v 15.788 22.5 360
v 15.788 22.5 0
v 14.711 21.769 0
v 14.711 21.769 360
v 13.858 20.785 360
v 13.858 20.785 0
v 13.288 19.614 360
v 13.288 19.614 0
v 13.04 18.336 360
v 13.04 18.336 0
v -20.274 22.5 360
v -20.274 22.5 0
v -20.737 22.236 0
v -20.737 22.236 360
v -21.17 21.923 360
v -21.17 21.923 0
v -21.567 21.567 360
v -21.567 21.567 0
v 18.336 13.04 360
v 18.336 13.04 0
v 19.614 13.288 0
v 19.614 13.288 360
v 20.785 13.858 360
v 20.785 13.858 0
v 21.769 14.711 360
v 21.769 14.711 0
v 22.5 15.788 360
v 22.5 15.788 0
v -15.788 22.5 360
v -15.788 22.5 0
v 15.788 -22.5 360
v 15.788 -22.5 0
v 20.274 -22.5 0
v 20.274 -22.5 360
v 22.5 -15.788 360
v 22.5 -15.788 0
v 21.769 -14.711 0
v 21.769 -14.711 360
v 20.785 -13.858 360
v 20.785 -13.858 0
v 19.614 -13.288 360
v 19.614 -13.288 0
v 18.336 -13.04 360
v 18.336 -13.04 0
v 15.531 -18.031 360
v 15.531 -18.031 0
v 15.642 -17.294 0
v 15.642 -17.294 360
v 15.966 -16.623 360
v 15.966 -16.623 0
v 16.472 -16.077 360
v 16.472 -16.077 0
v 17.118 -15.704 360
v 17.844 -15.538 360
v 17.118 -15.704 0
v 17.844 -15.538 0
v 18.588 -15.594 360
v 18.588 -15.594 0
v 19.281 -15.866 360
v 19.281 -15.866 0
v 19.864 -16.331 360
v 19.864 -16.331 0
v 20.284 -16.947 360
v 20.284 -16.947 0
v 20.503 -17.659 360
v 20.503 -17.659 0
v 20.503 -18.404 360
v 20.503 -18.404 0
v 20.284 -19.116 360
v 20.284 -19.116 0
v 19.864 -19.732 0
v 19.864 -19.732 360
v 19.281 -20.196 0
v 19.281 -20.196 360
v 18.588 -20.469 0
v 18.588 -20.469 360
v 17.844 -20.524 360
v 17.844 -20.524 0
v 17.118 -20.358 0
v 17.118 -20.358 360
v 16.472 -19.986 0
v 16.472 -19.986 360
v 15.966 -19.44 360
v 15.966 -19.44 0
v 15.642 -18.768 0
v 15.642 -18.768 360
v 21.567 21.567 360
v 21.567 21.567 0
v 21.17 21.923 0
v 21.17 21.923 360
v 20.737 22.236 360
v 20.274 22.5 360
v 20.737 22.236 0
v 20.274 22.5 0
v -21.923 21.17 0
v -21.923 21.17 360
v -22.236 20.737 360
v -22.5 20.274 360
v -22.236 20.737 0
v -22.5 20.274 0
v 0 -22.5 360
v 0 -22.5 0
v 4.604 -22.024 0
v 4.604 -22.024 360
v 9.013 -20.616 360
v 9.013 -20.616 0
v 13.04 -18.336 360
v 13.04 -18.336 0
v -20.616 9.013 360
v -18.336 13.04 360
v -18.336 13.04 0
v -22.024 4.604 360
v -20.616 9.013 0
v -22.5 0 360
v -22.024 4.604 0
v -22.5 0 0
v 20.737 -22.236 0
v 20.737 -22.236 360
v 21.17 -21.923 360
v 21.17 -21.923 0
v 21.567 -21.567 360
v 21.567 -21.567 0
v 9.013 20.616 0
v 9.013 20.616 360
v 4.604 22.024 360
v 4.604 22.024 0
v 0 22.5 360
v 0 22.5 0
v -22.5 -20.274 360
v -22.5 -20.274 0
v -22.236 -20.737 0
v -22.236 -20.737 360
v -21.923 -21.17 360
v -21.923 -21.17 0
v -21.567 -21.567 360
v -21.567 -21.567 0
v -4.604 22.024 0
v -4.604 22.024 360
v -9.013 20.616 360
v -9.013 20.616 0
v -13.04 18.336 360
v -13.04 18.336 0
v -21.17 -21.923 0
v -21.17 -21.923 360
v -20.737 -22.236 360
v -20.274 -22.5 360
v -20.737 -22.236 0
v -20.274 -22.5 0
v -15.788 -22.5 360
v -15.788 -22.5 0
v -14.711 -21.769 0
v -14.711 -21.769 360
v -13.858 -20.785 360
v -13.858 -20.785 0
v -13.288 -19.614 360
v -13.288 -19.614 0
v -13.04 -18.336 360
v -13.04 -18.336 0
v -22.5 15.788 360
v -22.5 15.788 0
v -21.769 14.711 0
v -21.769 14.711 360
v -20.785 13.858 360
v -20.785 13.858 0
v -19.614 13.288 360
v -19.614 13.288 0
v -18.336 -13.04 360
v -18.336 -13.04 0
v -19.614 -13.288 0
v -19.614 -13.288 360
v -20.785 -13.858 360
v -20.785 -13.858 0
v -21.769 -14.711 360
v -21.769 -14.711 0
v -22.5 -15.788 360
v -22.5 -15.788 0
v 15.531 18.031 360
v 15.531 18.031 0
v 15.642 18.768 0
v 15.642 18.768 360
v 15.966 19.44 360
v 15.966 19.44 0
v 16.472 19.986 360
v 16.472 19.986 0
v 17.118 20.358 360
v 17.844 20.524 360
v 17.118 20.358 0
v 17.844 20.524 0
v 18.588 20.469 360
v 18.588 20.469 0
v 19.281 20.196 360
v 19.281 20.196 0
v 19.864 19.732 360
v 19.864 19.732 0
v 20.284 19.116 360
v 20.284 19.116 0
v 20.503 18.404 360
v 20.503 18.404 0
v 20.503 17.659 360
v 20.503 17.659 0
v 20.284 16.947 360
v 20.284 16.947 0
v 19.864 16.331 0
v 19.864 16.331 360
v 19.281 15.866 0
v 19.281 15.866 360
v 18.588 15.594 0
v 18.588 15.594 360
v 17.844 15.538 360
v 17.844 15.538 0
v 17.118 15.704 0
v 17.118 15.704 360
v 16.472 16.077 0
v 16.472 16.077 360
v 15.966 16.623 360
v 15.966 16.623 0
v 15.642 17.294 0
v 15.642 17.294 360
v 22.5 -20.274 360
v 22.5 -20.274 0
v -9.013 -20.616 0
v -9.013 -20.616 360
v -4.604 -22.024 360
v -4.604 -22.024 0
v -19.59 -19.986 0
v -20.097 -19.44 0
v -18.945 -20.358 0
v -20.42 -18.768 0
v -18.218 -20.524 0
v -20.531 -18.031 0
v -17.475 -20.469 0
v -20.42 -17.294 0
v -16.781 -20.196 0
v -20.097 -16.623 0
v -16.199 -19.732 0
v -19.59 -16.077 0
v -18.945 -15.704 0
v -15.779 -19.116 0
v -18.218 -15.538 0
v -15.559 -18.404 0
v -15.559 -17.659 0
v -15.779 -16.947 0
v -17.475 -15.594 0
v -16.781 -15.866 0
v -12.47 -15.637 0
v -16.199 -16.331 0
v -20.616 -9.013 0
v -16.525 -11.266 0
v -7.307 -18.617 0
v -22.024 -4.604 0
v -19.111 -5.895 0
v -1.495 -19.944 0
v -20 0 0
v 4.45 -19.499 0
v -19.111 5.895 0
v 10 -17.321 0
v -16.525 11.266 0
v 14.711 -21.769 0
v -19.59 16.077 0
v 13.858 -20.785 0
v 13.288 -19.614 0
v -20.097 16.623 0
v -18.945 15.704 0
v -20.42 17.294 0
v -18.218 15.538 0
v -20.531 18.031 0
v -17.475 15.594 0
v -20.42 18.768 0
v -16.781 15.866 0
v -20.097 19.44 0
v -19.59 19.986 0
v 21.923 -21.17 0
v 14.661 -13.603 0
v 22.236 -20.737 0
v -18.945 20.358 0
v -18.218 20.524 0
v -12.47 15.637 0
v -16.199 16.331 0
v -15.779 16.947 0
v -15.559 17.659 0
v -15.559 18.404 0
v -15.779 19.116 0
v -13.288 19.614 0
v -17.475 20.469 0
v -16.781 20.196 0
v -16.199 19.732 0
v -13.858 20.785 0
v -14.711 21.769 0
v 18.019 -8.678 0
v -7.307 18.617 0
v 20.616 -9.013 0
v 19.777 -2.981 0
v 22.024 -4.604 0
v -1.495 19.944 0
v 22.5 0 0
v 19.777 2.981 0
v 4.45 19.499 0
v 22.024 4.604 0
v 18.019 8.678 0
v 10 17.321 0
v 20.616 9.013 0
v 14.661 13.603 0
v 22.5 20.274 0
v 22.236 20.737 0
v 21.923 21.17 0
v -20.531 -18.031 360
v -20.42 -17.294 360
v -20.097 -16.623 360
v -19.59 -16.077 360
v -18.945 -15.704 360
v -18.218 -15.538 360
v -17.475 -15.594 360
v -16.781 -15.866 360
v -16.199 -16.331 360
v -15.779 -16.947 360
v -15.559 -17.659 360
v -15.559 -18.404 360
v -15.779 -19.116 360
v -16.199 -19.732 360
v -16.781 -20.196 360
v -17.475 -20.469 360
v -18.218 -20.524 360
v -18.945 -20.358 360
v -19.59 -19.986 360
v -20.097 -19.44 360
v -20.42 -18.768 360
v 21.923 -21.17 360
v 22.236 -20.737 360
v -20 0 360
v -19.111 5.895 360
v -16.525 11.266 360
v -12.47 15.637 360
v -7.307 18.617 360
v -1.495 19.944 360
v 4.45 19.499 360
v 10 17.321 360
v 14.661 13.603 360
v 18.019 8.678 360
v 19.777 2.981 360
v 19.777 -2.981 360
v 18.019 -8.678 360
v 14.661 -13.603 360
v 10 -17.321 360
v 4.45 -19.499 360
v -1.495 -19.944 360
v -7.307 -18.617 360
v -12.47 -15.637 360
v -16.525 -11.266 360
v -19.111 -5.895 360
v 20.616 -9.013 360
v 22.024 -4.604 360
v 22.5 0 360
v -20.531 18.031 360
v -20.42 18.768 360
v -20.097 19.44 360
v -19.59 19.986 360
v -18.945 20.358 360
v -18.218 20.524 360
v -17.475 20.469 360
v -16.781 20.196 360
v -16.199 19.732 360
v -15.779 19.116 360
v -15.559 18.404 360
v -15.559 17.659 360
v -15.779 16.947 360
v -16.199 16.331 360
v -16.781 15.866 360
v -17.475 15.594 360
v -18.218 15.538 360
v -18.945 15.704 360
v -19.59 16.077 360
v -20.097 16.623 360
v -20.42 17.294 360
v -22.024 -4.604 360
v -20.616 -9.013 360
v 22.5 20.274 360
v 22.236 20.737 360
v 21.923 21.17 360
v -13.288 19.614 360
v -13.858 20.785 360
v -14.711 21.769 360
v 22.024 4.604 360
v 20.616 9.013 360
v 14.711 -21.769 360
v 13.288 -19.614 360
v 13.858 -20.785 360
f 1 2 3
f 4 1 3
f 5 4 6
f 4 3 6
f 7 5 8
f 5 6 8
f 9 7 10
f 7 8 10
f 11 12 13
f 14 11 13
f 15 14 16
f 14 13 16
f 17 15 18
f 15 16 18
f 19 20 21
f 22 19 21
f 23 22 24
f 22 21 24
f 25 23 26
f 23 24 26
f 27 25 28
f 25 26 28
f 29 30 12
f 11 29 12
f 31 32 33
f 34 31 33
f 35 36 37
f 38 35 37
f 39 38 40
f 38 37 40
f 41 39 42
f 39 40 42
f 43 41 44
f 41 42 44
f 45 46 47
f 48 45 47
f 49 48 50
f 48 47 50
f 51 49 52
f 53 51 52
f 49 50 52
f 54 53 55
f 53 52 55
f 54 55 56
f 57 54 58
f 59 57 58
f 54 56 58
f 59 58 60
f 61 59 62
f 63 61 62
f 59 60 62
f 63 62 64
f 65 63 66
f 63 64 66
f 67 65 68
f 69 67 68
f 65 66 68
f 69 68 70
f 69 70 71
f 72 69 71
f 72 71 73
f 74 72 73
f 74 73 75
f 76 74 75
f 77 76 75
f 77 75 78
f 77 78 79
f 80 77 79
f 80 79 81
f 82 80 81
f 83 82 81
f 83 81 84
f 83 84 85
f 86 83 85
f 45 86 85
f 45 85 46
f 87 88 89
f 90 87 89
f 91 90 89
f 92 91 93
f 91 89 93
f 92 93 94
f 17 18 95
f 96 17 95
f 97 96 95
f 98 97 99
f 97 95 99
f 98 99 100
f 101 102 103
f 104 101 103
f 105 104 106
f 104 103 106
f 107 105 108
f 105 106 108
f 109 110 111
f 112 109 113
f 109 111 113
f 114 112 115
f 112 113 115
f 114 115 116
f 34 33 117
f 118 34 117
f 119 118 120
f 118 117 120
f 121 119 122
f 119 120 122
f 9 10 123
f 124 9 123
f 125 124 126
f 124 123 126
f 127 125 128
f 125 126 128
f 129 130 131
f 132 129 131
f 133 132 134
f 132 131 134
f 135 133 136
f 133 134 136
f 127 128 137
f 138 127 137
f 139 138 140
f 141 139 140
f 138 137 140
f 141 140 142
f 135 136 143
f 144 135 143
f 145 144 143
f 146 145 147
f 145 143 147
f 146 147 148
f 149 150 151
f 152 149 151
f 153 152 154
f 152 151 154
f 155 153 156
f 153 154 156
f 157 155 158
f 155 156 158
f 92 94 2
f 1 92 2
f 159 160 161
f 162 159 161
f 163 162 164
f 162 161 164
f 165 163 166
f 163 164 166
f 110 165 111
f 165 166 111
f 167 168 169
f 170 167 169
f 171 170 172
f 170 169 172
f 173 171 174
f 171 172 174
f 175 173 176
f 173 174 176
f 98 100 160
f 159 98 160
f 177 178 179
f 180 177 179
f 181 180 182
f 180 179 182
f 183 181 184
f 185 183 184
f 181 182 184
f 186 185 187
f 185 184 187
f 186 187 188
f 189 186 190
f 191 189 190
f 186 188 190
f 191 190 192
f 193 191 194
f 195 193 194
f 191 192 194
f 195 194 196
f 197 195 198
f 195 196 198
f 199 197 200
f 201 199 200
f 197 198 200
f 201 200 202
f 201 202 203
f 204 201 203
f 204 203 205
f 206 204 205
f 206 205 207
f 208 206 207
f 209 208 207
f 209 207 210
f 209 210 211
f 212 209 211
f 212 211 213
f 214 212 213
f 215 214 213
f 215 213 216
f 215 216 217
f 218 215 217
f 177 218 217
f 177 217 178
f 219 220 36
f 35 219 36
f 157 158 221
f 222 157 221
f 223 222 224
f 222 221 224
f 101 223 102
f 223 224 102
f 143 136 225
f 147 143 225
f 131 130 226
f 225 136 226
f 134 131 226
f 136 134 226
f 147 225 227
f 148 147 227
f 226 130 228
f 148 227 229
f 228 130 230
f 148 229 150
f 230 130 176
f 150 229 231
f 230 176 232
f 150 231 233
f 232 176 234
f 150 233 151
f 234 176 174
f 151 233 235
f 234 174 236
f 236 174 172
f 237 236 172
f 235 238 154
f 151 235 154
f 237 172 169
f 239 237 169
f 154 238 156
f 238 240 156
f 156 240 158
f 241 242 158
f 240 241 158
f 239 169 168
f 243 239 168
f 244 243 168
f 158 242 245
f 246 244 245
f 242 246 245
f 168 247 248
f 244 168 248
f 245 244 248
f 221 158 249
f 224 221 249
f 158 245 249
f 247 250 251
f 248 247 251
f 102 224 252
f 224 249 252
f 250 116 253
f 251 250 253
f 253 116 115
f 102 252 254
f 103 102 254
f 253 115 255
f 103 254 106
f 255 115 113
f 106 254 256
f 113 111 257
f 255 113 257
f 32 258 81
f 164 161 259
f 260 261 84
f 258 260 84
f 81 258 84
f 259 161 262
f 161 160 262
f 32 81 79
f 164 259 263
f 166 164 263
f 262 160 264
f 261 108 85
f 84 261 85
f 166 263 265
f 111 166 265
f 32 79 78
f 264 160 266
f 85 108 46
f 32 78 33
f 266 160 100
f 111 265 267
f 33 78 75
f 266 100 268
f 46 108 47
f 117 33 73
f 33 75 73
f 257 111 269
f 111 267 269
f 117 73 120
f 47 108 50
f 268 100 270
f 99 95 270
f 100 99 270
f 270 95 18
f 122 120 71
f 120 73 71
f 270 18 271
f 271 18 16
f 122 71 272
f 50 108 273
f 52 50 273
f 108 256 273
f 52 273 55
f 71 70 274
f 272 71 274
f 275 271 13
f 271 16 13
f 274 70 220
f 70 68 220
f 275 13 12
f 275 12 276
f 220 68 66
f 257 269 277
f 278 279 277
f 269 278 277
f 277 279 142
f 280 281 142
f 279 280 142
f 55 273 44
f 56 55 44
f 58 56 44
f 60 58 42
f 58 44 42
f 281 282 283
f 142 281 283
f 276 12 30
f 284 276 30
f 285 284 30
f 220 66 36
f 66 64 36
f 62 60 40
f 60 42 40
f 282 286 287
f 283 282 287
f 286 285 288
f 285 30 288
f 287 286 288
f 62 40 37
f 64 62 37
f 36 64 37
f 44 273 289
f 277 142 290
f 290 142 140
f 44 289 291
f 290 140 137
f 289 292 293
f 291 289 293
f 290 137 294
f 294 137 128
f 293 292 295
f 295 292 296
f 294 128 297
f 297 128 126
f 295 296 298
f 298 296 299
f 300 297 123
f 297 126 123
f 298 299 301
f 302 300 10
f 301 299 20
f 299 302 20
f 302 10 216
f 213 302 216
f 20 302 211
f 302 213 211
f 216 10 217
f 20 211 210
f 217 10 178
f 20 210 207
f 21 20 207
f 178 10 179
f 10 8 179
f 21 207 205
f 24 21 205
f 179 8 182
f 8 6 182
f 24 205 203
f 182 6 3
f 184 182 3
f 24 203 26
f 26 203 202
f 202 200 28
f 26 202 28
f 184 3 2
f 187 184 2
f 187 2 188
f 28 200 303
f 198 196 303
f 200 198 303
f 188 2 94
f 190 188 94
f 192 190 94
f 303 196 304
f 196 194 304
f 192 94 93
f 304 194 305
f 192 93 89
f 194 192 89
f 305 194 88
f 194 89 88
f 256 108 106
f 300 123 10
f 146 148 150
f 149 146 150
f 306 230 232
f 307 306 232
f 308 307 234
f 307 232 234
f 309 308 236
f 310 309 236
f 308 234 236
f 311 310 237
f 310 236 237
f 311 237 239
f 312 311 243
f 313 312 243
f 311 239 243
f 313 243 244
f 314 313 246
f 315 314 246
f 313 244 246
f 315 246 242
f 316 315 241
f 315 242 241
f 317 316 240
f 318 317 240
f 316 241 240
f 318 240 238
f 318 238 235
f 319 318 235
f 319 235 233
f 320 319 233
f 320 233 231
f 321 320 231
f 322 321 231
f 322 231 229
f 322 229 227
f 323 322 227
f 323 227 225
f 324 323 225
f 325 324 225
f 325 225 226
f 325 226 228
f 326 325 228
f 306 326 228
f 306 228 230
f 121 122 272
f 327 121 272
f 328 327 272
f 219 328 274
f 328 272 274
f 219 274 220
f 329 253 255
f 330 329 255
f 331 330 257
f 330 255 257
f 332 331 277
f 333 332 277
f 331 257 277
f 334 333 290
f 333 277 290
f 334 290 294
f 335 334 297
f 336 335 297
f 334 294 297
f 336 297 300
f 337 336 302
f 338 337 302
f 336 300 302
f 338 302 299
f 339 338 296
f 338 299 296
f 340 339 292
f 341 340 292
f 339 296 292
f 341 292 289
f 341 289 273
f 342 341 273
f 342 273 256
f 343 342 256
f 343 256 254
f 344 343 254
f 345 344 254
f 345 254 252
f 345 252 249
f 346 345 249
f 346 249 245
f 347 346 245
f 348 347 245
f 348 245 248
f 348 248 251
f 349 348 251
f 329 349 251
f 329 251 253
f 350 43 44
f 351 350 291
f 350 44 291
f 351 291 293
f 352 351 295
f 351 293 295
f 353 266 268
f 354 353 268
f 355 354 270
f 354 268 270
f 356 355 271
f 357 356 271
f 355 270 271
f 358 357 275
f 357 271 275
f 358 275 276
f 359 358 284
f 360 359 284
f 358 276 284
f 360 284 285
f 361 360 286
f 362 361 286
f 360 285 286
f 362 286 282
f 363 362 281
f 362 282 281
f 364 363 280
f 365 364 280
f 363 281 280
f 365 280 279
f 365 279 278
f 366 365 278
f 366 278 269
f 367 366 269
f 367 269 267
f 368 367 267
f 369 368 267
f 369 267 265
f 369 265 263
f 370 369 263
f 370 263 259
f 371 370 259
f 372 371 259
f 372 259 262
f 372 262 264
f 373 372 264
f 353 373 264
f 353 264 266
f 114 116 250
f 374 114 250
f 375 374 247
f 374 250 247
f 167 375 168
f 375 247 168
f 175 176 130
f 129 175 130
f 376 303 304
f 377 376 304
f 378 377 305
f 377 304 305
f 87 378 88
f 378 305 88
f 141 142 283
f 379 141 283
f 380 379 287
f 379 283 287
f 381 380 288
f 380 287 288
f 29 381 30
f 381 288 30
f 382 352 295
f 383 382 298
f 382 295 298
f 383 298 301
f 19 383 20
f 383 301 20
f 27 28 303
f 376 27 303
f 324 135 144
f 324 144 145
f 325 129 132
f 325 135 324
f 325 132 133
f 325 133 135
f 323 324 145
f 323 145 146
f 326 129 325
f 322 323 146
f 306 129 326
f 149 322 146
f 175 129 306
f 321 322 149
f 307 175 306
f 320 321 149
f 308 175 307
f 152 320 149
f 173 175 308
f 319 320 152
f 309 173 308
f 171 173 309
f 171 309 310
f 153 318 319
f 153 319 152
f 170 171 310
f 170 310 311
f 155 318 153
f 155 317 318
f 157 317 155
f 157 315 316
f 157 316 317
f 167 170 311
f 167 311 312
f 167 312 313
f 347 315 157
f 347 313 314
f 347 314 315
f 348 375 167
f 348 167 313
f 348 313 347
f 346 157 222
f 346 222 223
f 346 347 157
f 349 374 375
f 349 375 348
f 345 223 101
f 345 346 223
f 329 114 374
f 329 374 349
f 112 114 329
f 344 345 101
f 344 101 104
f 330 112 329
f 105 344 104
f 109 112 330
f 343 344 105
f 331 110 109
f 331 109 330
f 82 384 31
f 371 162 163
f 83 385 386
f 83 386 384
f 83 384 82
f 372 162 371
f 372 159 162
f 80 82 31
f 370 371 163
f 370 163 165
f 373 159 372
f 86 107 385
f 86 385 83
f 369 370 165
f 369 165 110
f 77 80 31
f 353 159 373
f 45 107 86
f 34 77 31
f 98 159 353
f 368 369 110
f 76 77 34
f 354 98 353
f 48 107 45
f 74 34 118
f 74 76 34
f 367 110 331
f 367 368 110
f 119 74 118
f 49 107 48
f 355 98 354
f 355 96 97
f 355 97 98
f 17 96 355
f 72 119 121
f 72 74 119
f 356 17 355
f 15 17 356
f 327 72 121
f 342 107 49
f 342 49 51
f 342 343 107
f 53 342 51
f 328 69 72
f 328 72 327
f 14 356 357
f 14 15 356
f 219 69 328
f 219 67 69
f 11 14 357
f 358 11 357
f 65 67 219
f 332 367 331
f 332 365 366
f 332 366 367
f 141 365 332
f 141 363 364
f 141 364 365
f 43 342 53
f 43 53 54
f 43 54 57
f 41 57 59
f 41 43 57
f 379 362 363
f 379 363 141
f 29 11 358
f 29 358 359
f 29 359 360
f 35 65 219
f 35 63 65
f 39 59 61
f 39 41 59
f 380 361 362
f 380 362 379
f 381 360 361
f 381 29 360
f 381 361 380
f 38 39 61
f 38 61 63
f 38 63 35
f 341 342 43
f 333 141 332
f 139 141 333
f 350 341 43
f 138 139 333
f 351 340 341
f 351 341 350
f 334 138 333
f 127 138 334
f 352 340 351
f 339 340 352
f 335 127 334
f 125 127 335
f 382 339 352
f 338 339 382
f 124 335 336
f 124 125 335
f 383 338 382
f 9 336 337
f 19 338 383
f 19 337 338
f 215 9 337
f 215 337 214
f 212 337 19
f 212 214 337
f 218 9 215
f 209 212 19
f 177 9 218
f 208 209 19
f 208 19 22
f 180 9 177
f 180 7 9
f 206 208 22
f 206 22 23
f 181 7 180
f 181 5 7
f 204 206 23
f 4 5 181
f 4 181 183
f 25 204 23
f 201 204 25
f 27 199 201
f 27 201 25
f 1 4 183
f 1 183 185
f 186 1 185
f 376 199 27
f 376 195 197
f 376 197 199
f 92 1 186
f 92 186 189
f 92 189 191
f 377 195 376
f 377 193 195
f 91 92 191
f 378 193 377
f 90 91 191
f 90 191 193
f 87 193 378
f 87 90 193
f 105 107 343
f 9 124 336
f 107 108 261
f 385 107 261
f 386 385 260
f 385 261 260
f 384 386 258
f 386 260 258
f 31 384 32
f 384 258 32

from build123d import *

# Parameters (mm, degrees)
F1_DEPTH = 360
F3_D     = 40
F5_D     = 5


with BuildPart() as f1:
    # F0 (on Top) → F1 (new body)
    with BuildSketch(Plane.XY):
        with BuildLine():
            Line((-14.4956890143, -14.4956890143), (0, 0))
            Line((0, 0), (-14.4956890143, 14.4956890143))
            ThreePointArc((-14.4956890143, 14.4956890143), (-16.2593773691, 13.3556947851), (-18.3356322814, 13.0404980289))
            ThreePointArc((-18.3356322814, 13.0404980289), (-21.4336385815, 6.8446429532), (-22.5, 4.93e-08))
            ThreePointArc((-22.5, 4.93e-08), (-21.4336385965, -6.8446429062), (-18.3356322814, -13.0404980289))
            ThreePointArc((-18.3356322814, -13.0404980289), (-16.2593773691, -13.3556947851), (-14.4956890143, -14.4956890143))
        make_face()
        with BuildLine():
            Line((-14.4956890143, 14.4956890143), (0, 0))
            Line((0, 0), (14.4956890143, 14.4956890143))
            ThreePointArc((14.4956890143, 14.4956890143), (13.3556947851, 16.2593773691), (13.0404980289, 18.3356322814))
            ThreePointArc((13.0404980289, 18.3356322814), (6.8446429123, 21.4336385946), (-3.64e-08, 22.5))
            ThreePointArc((-3.64e-08, 22.5), (-6.844642947, 21.4336385835), (-13.0404980289, 18.3356322814))
            ThreePointArc((-13.0404980289, 18.3356322814), (-13.0335422353, 18.1834982357), (-13.0312229203, 18.0312229203))
            ThreePointArc((-13.0312229203, 18.0312229203), (-13.4118252577, 16.1178057584), (-14.4956890143, 14.4956890143))
        make_face()
        with BuildLine():
            Line((0, 0), (22.5, 0))
            ThreePointArc((22.5, 0), (21.433638589, 6.8446429297), (18.3356322814, 13.0404980289))
            ThreePointArc((18.3356322814, 13.0404980289), (16.2593773691, 13.3556947851), (14.4956890143, 14.4956890143))
            Line((14.4956890143, 14.4956890143), (0, 0))
        make_face()
        with BuildLine():
            ThreePointArc((18.3356322814, -13.0404980289), (21.433638589, -6.8446429297), (22.5, 0))
            Line((22.5, 0), (0, 0))
            Line((0, 0), (14.4956890143, -14.4956890143))
            ThreePointArc((14.4956890143, -14.4956890143), (16.2593773691, -13.3556947851), (18.3356322814, -13.0404980289))
        make_face()
        with BuildLine():
            Line((14.4956890143, -14.4956890143), (0, 0))
            Line((0, 0), (-14.4956890143, -14.4956890143))
            ThreePointArc((-14.4956890143, -14.4956890143), (-13.4118252577, -16.1178057584), (-13.0312229203, -18.0312229203))
            ThreePointArc((-13.0312229203, -18.0312229203), (-13.0335422353, -18.1834982357), (-13.0404980289, -18.3356322814))
            ThreePointArc((-13.0404980289, -18.3356322814), (-6.8446429175, -21.4336385929), (2.56e-08, -22.5))
            ThreePointArc((2.56e-08, -22.5), (6.8446429419, -21.4336385851), (13.0404980289, -18.3356322814))
            ThreePointArc((13.0404980289, -18.3356322814), (13.3556947851, -16.2593773691), (14.4956890143, -14.4956890143))
        make_face()
        with BuildLine():
            ThreePointArc((-18.3356322814, 13.0404980289), (-16.2593773691, 13.3556947851), (-14.4956890143, 14.4956890143))
            Line((-14.4956890143, 14.4956890143), (-15.9099025767, 15.9099025767))
            ThreePointArc((-15.9099025767, 15.9099025767), (-17.18276855, 14.5259238934), (-18.3356322814, 13.0404980289))
        make_face()
        with BuildLine():
            Line((-15.9099025767, 15.9099025767), (-14.4956890143, 14.4956890143))
            ThreePointArc((-14.4956890143, 14.4956890143), (-13.4118252577, 16.1178057584), (-13.0312229203, 18.0312229203))
            ThreePointArc((-13.0312229203, 18.0312229203), (-13.0335422353, 18.1834982357), (-13.0404980289, 18.3356322814))
            ThreePointArc((-13.0404980289, 18.3356322814), (-14.5259238934, 17.18276855), (-15.9099025767, 15.9099025767))
        make_face()
        with BuildLine():
            Line((-18.0312229203, 18.0312229203), (-15.9099025767, 15.9099025767))
            ThreePointArc((-15.9099025767, 15.9099025767), (-14.5259238934, 17.18276855), (-13.0404980289, 18.3356322814))
            ThreePointArc((-13.0404980289, 18.3356322814), (-13.8579312806, 20.7850633096), (-15.7884497682, 22.5))
            Line((-15.7884497682, 22.5), (-20.2739960723, 22.5))
            ThreePointArc((-20.2739960723, 22.5), (-20.9578154473, 22.0852402094), (-21.5667568262, 21.5667568262))
            Line((-21.5667568262, 21.5667568262), (-18.0312229203, 18.0312229203))
        make_face()
        with BuildLine():
            ThreePointArc((-18.3356322814, 13.0404980289), (-17.18276855, 14.5259238934), (-15.9099025767, 15.9099025767))
            Line((-15.9099025767, 15.9099025767), (-18.0312229203, 18.0312229203))
            Line((-18.0312229203, 18.0312229203), (-21.5667568262, 21.5667568262))
            ThreePointArc((-21.5667568262, 21.5667568262), (-22.0852402094, 20.9578154473), (-22.5, 20.2739960723))
            Line((-22.5, 20.2739960723), (-22.5, 15.7884497682))
            ThreePointArc((-22.5, 15.7884497682), (-20.7850633096, 13.8579312806), (-18.3356322814, 13.0404980289))
        make_face()
        with BuildLine():
            ThreePointArc((13.0404980289, 18.3356322814), (14.5259238934, 17.18276855), (15.9099025767, 15.9099025767))
            Line((15.9099025767, 15.9099025767), (21.5667568262, 21.5667568262))
            ThreePointArc((21.5667568262, 21.5667568262), (20.9578154473, 22.0852402094), (20.2739960723, 22.5))
            Line((20.2739960723, 22.5), (15.7884497682, 22.5))
            ThreePointArc((15.7884497682, 22.5), (13.8579312806, 20.7850633096), (13.0404980289, 18.3356322814))
        make_face()
        with BuildLine():
            ThreePointArc((15.9099025767, 15.9099025767), (17.18276855, 14.5259238934), (18.3356322814, 13.0404980289))
            ThreePointArc((18.3356322814, 13.0404980289), (20.7850633096, 13.8579312806), (22.5, 15.7884497682))
            Line((22.5, 15.7884497682), (22.5, 20.2739960723))
            ThreePointArc((22.5, 20.2739960723), (22.0852402094, 20.9578154473), (21.5667568262, 21.5667568262))
            Line((21.5667568262, 21.5667568262), (15.9099025767, 15.9099025767))
        make_face()
        with BuildLine():
            ThreePointArc((14.4956890143, 14.4956890143), (16.2593773691, 13.3556947851), (18.3356322814, 13.0404980289))
            ThreePointArc((18.3356322814, 13.0404980289), (17.18276855, 14.5259238934), (15.9099025767, 15.9099025767))
            Line((15.9099025767, 15.9099025767), (14.4956890143, 14.4956890143))
        make_face()
        with BuildLine():
            Line((14.4956890143, 14.4956890143), (15.9099025767, 15.9099025767))
            ThreePointArc((15.9099025767, 15.9099025767), (14.5259238934, 17.18276855), (13.0404980289, 18.3356322814))
            ThreePointArc((13.0404980289, 18.3356322814), (13.3556947851, 16.2593773691), (14.4956890143, 14.4956890143))
        make_face()
        with BuildLine():
            Line((21.5667568262, -21.5667568262), (15.9099025767, -15.9099025767))
            ThreePointArc((15.9099025767, -15.9099025767), (14.5259238934, -17.18276855), (13.0404980289, -18.3356322814))
            ThreePointArc((13.0404980289, -18.3356322814), (13.8579312806, -20.7850633096), (15.7884497682, -22.5))
            Line((15.7884497682, -22.5), (20.2739960723, -22.5))
            ThreePointArc((20.2739960723, -22.5), (20.9578154473, -22.0852402094), (21.5667568262, -21.5667568262))
        make_face()
        with BuildLine():
            ThreePointArc((22.5, -15.7884497682), (20.7850633096, -13.8579312806), (18.3356322814, -13.0404980289))
            ThreePointArc((18.3356322814, -13.0404980289), (17.18276855, -14.5259238934), (15.9099025767, -15.9099025767))
            Line((15.9099025767, -15.9099025767), (21.5667568262, -21.5667568262))
            ThreePointArc((21.5667568262, -21.5667568262), (22.0852402094, -20.9578154473), (22.5, -20.2739960723))
            Line((22.5, -20.2739960723), (22.5, -15.7884497682))
        make_face()
        with BuildLine():
            ThreePointArc((15.9099025767, -15.9099025767), (17.18276855, -14.5259238934), (18.3356322814, -13.0404980289))
            ThreePointArc((18.3356322814, -13.0404980289), (16.2593773691, -13.3556947851), (14.4956890143, -14.4956890143))
            Line((14.4956890143, -14.4956890143), (15.9099025767, -15.9099025767))
        make_face()
        with BuildLine():
            ThreePointArc((13.0404980289, -18.3356322814), (14.5259238934, -17.18276855), (15.9099025767, -15.9099025767))
            Line((15.9099025767, -15.9099025767), (14.4956890143, -14.4956890143))
            ThreePointArc((14.4956890143, -14.4956890143), (13.3556947851, -16.2593773691), (13.0404980289, -18.3356322814))
        make_face()
        with BuildLine():
            Line((-21.5667568262, -21.5667568262), (-15.9099025767, -15.9099025767))
            ThreePointArc((-15.9099025767, -15.9099025767), (-17.18276855, -14.5259238934), (-18.3356322814, -13.0404980289))
            ThreePointArc((-18.3356322814, -13.0404980289), (-20.7850633096, -13.8579312806), (-22.5, -15.7884497682))
            Line((-22.5, -15.7884497682), (-22.5, -20.2739960723))
            ThreePointArc((-22.5, -20.2739960723), (-22.0852402094, -20.9578154473), (-21.5667568262, -21.5667568262))
        make_face()
        with BuildLine():
            ThreePointArc((-13.0404980289, -18.3356322814), (-14.5259238934, -17.18276855), (-15.9099025767, -15.9099025767))
            Line((-15.9099025767, -15.9099025767), (-21.5667568262, -21.5667568262))
            ThreePointArc((-21.5667568262, -21.5667568262), (-20.9578154473, -22.0852402094), (-20.2739960723, -22.5))
            Line((-20.2739960723, -22.5), (-15.7884497682, -22.5))
            ThreePointArc((-15.7884497682, -22.5), (-13.8579312806, -20.7850633096), (-13.0404980289, -18.3356322814))
        make_face()
        with BuildLine():
            ThreePointArc((-13.0312229203, -18.0312229203), (-13.4118252577, -16.1178057584), (-14.4956890143, -14.4956890143))
            Line((-14.4956890143, -14.4956890143), (-15.9099025767, -15.9099025767))
            ThreePointArc((-15.9099025767, -15.9099025767), (-14.5259238934, -17.18276855), (-13.0404980289, -18.3356322814))
            ThreePointArc((-13.0404980289, -18.3356322814), (-13.0335422353, -18.1834982357), (-13.0312229203, -18.0312229203))
        make_face()
        with BuildLine():
            Line((-15.9099025767, -15.9099025767), (-14.4956890143, -14.4956890143))
            ThreePointArc((-14.4956890143, -14.4956890143), (-16.2593773691, -13.3556947851), (-18.3356322814, -13.0404980289))
            ThreePointArc((-18.3356322814, -13.0404980289), (-17.18276855, -14.5259238934), (-15.9099025767, -15.9099025767))
        make_face()
    extrude(amount=F1_DEPTH)

    # F3 (through all)
    with Locations(Plane.XY.offset(360)):
        with Locations((0, 0)):
            Hole(F3_D / 2)

    # F5 (through all)
    with Locations(Plane.XY.offset(360)):
        with Locations((-18.0312229203, 18.0312229203), (18.0312229203, 18.0312229203), (18.0312229203, -18.0312229203), (-18.0312229203, -18.0312229203)):
            Hole(F5_D / 2)


solid = f1.part
